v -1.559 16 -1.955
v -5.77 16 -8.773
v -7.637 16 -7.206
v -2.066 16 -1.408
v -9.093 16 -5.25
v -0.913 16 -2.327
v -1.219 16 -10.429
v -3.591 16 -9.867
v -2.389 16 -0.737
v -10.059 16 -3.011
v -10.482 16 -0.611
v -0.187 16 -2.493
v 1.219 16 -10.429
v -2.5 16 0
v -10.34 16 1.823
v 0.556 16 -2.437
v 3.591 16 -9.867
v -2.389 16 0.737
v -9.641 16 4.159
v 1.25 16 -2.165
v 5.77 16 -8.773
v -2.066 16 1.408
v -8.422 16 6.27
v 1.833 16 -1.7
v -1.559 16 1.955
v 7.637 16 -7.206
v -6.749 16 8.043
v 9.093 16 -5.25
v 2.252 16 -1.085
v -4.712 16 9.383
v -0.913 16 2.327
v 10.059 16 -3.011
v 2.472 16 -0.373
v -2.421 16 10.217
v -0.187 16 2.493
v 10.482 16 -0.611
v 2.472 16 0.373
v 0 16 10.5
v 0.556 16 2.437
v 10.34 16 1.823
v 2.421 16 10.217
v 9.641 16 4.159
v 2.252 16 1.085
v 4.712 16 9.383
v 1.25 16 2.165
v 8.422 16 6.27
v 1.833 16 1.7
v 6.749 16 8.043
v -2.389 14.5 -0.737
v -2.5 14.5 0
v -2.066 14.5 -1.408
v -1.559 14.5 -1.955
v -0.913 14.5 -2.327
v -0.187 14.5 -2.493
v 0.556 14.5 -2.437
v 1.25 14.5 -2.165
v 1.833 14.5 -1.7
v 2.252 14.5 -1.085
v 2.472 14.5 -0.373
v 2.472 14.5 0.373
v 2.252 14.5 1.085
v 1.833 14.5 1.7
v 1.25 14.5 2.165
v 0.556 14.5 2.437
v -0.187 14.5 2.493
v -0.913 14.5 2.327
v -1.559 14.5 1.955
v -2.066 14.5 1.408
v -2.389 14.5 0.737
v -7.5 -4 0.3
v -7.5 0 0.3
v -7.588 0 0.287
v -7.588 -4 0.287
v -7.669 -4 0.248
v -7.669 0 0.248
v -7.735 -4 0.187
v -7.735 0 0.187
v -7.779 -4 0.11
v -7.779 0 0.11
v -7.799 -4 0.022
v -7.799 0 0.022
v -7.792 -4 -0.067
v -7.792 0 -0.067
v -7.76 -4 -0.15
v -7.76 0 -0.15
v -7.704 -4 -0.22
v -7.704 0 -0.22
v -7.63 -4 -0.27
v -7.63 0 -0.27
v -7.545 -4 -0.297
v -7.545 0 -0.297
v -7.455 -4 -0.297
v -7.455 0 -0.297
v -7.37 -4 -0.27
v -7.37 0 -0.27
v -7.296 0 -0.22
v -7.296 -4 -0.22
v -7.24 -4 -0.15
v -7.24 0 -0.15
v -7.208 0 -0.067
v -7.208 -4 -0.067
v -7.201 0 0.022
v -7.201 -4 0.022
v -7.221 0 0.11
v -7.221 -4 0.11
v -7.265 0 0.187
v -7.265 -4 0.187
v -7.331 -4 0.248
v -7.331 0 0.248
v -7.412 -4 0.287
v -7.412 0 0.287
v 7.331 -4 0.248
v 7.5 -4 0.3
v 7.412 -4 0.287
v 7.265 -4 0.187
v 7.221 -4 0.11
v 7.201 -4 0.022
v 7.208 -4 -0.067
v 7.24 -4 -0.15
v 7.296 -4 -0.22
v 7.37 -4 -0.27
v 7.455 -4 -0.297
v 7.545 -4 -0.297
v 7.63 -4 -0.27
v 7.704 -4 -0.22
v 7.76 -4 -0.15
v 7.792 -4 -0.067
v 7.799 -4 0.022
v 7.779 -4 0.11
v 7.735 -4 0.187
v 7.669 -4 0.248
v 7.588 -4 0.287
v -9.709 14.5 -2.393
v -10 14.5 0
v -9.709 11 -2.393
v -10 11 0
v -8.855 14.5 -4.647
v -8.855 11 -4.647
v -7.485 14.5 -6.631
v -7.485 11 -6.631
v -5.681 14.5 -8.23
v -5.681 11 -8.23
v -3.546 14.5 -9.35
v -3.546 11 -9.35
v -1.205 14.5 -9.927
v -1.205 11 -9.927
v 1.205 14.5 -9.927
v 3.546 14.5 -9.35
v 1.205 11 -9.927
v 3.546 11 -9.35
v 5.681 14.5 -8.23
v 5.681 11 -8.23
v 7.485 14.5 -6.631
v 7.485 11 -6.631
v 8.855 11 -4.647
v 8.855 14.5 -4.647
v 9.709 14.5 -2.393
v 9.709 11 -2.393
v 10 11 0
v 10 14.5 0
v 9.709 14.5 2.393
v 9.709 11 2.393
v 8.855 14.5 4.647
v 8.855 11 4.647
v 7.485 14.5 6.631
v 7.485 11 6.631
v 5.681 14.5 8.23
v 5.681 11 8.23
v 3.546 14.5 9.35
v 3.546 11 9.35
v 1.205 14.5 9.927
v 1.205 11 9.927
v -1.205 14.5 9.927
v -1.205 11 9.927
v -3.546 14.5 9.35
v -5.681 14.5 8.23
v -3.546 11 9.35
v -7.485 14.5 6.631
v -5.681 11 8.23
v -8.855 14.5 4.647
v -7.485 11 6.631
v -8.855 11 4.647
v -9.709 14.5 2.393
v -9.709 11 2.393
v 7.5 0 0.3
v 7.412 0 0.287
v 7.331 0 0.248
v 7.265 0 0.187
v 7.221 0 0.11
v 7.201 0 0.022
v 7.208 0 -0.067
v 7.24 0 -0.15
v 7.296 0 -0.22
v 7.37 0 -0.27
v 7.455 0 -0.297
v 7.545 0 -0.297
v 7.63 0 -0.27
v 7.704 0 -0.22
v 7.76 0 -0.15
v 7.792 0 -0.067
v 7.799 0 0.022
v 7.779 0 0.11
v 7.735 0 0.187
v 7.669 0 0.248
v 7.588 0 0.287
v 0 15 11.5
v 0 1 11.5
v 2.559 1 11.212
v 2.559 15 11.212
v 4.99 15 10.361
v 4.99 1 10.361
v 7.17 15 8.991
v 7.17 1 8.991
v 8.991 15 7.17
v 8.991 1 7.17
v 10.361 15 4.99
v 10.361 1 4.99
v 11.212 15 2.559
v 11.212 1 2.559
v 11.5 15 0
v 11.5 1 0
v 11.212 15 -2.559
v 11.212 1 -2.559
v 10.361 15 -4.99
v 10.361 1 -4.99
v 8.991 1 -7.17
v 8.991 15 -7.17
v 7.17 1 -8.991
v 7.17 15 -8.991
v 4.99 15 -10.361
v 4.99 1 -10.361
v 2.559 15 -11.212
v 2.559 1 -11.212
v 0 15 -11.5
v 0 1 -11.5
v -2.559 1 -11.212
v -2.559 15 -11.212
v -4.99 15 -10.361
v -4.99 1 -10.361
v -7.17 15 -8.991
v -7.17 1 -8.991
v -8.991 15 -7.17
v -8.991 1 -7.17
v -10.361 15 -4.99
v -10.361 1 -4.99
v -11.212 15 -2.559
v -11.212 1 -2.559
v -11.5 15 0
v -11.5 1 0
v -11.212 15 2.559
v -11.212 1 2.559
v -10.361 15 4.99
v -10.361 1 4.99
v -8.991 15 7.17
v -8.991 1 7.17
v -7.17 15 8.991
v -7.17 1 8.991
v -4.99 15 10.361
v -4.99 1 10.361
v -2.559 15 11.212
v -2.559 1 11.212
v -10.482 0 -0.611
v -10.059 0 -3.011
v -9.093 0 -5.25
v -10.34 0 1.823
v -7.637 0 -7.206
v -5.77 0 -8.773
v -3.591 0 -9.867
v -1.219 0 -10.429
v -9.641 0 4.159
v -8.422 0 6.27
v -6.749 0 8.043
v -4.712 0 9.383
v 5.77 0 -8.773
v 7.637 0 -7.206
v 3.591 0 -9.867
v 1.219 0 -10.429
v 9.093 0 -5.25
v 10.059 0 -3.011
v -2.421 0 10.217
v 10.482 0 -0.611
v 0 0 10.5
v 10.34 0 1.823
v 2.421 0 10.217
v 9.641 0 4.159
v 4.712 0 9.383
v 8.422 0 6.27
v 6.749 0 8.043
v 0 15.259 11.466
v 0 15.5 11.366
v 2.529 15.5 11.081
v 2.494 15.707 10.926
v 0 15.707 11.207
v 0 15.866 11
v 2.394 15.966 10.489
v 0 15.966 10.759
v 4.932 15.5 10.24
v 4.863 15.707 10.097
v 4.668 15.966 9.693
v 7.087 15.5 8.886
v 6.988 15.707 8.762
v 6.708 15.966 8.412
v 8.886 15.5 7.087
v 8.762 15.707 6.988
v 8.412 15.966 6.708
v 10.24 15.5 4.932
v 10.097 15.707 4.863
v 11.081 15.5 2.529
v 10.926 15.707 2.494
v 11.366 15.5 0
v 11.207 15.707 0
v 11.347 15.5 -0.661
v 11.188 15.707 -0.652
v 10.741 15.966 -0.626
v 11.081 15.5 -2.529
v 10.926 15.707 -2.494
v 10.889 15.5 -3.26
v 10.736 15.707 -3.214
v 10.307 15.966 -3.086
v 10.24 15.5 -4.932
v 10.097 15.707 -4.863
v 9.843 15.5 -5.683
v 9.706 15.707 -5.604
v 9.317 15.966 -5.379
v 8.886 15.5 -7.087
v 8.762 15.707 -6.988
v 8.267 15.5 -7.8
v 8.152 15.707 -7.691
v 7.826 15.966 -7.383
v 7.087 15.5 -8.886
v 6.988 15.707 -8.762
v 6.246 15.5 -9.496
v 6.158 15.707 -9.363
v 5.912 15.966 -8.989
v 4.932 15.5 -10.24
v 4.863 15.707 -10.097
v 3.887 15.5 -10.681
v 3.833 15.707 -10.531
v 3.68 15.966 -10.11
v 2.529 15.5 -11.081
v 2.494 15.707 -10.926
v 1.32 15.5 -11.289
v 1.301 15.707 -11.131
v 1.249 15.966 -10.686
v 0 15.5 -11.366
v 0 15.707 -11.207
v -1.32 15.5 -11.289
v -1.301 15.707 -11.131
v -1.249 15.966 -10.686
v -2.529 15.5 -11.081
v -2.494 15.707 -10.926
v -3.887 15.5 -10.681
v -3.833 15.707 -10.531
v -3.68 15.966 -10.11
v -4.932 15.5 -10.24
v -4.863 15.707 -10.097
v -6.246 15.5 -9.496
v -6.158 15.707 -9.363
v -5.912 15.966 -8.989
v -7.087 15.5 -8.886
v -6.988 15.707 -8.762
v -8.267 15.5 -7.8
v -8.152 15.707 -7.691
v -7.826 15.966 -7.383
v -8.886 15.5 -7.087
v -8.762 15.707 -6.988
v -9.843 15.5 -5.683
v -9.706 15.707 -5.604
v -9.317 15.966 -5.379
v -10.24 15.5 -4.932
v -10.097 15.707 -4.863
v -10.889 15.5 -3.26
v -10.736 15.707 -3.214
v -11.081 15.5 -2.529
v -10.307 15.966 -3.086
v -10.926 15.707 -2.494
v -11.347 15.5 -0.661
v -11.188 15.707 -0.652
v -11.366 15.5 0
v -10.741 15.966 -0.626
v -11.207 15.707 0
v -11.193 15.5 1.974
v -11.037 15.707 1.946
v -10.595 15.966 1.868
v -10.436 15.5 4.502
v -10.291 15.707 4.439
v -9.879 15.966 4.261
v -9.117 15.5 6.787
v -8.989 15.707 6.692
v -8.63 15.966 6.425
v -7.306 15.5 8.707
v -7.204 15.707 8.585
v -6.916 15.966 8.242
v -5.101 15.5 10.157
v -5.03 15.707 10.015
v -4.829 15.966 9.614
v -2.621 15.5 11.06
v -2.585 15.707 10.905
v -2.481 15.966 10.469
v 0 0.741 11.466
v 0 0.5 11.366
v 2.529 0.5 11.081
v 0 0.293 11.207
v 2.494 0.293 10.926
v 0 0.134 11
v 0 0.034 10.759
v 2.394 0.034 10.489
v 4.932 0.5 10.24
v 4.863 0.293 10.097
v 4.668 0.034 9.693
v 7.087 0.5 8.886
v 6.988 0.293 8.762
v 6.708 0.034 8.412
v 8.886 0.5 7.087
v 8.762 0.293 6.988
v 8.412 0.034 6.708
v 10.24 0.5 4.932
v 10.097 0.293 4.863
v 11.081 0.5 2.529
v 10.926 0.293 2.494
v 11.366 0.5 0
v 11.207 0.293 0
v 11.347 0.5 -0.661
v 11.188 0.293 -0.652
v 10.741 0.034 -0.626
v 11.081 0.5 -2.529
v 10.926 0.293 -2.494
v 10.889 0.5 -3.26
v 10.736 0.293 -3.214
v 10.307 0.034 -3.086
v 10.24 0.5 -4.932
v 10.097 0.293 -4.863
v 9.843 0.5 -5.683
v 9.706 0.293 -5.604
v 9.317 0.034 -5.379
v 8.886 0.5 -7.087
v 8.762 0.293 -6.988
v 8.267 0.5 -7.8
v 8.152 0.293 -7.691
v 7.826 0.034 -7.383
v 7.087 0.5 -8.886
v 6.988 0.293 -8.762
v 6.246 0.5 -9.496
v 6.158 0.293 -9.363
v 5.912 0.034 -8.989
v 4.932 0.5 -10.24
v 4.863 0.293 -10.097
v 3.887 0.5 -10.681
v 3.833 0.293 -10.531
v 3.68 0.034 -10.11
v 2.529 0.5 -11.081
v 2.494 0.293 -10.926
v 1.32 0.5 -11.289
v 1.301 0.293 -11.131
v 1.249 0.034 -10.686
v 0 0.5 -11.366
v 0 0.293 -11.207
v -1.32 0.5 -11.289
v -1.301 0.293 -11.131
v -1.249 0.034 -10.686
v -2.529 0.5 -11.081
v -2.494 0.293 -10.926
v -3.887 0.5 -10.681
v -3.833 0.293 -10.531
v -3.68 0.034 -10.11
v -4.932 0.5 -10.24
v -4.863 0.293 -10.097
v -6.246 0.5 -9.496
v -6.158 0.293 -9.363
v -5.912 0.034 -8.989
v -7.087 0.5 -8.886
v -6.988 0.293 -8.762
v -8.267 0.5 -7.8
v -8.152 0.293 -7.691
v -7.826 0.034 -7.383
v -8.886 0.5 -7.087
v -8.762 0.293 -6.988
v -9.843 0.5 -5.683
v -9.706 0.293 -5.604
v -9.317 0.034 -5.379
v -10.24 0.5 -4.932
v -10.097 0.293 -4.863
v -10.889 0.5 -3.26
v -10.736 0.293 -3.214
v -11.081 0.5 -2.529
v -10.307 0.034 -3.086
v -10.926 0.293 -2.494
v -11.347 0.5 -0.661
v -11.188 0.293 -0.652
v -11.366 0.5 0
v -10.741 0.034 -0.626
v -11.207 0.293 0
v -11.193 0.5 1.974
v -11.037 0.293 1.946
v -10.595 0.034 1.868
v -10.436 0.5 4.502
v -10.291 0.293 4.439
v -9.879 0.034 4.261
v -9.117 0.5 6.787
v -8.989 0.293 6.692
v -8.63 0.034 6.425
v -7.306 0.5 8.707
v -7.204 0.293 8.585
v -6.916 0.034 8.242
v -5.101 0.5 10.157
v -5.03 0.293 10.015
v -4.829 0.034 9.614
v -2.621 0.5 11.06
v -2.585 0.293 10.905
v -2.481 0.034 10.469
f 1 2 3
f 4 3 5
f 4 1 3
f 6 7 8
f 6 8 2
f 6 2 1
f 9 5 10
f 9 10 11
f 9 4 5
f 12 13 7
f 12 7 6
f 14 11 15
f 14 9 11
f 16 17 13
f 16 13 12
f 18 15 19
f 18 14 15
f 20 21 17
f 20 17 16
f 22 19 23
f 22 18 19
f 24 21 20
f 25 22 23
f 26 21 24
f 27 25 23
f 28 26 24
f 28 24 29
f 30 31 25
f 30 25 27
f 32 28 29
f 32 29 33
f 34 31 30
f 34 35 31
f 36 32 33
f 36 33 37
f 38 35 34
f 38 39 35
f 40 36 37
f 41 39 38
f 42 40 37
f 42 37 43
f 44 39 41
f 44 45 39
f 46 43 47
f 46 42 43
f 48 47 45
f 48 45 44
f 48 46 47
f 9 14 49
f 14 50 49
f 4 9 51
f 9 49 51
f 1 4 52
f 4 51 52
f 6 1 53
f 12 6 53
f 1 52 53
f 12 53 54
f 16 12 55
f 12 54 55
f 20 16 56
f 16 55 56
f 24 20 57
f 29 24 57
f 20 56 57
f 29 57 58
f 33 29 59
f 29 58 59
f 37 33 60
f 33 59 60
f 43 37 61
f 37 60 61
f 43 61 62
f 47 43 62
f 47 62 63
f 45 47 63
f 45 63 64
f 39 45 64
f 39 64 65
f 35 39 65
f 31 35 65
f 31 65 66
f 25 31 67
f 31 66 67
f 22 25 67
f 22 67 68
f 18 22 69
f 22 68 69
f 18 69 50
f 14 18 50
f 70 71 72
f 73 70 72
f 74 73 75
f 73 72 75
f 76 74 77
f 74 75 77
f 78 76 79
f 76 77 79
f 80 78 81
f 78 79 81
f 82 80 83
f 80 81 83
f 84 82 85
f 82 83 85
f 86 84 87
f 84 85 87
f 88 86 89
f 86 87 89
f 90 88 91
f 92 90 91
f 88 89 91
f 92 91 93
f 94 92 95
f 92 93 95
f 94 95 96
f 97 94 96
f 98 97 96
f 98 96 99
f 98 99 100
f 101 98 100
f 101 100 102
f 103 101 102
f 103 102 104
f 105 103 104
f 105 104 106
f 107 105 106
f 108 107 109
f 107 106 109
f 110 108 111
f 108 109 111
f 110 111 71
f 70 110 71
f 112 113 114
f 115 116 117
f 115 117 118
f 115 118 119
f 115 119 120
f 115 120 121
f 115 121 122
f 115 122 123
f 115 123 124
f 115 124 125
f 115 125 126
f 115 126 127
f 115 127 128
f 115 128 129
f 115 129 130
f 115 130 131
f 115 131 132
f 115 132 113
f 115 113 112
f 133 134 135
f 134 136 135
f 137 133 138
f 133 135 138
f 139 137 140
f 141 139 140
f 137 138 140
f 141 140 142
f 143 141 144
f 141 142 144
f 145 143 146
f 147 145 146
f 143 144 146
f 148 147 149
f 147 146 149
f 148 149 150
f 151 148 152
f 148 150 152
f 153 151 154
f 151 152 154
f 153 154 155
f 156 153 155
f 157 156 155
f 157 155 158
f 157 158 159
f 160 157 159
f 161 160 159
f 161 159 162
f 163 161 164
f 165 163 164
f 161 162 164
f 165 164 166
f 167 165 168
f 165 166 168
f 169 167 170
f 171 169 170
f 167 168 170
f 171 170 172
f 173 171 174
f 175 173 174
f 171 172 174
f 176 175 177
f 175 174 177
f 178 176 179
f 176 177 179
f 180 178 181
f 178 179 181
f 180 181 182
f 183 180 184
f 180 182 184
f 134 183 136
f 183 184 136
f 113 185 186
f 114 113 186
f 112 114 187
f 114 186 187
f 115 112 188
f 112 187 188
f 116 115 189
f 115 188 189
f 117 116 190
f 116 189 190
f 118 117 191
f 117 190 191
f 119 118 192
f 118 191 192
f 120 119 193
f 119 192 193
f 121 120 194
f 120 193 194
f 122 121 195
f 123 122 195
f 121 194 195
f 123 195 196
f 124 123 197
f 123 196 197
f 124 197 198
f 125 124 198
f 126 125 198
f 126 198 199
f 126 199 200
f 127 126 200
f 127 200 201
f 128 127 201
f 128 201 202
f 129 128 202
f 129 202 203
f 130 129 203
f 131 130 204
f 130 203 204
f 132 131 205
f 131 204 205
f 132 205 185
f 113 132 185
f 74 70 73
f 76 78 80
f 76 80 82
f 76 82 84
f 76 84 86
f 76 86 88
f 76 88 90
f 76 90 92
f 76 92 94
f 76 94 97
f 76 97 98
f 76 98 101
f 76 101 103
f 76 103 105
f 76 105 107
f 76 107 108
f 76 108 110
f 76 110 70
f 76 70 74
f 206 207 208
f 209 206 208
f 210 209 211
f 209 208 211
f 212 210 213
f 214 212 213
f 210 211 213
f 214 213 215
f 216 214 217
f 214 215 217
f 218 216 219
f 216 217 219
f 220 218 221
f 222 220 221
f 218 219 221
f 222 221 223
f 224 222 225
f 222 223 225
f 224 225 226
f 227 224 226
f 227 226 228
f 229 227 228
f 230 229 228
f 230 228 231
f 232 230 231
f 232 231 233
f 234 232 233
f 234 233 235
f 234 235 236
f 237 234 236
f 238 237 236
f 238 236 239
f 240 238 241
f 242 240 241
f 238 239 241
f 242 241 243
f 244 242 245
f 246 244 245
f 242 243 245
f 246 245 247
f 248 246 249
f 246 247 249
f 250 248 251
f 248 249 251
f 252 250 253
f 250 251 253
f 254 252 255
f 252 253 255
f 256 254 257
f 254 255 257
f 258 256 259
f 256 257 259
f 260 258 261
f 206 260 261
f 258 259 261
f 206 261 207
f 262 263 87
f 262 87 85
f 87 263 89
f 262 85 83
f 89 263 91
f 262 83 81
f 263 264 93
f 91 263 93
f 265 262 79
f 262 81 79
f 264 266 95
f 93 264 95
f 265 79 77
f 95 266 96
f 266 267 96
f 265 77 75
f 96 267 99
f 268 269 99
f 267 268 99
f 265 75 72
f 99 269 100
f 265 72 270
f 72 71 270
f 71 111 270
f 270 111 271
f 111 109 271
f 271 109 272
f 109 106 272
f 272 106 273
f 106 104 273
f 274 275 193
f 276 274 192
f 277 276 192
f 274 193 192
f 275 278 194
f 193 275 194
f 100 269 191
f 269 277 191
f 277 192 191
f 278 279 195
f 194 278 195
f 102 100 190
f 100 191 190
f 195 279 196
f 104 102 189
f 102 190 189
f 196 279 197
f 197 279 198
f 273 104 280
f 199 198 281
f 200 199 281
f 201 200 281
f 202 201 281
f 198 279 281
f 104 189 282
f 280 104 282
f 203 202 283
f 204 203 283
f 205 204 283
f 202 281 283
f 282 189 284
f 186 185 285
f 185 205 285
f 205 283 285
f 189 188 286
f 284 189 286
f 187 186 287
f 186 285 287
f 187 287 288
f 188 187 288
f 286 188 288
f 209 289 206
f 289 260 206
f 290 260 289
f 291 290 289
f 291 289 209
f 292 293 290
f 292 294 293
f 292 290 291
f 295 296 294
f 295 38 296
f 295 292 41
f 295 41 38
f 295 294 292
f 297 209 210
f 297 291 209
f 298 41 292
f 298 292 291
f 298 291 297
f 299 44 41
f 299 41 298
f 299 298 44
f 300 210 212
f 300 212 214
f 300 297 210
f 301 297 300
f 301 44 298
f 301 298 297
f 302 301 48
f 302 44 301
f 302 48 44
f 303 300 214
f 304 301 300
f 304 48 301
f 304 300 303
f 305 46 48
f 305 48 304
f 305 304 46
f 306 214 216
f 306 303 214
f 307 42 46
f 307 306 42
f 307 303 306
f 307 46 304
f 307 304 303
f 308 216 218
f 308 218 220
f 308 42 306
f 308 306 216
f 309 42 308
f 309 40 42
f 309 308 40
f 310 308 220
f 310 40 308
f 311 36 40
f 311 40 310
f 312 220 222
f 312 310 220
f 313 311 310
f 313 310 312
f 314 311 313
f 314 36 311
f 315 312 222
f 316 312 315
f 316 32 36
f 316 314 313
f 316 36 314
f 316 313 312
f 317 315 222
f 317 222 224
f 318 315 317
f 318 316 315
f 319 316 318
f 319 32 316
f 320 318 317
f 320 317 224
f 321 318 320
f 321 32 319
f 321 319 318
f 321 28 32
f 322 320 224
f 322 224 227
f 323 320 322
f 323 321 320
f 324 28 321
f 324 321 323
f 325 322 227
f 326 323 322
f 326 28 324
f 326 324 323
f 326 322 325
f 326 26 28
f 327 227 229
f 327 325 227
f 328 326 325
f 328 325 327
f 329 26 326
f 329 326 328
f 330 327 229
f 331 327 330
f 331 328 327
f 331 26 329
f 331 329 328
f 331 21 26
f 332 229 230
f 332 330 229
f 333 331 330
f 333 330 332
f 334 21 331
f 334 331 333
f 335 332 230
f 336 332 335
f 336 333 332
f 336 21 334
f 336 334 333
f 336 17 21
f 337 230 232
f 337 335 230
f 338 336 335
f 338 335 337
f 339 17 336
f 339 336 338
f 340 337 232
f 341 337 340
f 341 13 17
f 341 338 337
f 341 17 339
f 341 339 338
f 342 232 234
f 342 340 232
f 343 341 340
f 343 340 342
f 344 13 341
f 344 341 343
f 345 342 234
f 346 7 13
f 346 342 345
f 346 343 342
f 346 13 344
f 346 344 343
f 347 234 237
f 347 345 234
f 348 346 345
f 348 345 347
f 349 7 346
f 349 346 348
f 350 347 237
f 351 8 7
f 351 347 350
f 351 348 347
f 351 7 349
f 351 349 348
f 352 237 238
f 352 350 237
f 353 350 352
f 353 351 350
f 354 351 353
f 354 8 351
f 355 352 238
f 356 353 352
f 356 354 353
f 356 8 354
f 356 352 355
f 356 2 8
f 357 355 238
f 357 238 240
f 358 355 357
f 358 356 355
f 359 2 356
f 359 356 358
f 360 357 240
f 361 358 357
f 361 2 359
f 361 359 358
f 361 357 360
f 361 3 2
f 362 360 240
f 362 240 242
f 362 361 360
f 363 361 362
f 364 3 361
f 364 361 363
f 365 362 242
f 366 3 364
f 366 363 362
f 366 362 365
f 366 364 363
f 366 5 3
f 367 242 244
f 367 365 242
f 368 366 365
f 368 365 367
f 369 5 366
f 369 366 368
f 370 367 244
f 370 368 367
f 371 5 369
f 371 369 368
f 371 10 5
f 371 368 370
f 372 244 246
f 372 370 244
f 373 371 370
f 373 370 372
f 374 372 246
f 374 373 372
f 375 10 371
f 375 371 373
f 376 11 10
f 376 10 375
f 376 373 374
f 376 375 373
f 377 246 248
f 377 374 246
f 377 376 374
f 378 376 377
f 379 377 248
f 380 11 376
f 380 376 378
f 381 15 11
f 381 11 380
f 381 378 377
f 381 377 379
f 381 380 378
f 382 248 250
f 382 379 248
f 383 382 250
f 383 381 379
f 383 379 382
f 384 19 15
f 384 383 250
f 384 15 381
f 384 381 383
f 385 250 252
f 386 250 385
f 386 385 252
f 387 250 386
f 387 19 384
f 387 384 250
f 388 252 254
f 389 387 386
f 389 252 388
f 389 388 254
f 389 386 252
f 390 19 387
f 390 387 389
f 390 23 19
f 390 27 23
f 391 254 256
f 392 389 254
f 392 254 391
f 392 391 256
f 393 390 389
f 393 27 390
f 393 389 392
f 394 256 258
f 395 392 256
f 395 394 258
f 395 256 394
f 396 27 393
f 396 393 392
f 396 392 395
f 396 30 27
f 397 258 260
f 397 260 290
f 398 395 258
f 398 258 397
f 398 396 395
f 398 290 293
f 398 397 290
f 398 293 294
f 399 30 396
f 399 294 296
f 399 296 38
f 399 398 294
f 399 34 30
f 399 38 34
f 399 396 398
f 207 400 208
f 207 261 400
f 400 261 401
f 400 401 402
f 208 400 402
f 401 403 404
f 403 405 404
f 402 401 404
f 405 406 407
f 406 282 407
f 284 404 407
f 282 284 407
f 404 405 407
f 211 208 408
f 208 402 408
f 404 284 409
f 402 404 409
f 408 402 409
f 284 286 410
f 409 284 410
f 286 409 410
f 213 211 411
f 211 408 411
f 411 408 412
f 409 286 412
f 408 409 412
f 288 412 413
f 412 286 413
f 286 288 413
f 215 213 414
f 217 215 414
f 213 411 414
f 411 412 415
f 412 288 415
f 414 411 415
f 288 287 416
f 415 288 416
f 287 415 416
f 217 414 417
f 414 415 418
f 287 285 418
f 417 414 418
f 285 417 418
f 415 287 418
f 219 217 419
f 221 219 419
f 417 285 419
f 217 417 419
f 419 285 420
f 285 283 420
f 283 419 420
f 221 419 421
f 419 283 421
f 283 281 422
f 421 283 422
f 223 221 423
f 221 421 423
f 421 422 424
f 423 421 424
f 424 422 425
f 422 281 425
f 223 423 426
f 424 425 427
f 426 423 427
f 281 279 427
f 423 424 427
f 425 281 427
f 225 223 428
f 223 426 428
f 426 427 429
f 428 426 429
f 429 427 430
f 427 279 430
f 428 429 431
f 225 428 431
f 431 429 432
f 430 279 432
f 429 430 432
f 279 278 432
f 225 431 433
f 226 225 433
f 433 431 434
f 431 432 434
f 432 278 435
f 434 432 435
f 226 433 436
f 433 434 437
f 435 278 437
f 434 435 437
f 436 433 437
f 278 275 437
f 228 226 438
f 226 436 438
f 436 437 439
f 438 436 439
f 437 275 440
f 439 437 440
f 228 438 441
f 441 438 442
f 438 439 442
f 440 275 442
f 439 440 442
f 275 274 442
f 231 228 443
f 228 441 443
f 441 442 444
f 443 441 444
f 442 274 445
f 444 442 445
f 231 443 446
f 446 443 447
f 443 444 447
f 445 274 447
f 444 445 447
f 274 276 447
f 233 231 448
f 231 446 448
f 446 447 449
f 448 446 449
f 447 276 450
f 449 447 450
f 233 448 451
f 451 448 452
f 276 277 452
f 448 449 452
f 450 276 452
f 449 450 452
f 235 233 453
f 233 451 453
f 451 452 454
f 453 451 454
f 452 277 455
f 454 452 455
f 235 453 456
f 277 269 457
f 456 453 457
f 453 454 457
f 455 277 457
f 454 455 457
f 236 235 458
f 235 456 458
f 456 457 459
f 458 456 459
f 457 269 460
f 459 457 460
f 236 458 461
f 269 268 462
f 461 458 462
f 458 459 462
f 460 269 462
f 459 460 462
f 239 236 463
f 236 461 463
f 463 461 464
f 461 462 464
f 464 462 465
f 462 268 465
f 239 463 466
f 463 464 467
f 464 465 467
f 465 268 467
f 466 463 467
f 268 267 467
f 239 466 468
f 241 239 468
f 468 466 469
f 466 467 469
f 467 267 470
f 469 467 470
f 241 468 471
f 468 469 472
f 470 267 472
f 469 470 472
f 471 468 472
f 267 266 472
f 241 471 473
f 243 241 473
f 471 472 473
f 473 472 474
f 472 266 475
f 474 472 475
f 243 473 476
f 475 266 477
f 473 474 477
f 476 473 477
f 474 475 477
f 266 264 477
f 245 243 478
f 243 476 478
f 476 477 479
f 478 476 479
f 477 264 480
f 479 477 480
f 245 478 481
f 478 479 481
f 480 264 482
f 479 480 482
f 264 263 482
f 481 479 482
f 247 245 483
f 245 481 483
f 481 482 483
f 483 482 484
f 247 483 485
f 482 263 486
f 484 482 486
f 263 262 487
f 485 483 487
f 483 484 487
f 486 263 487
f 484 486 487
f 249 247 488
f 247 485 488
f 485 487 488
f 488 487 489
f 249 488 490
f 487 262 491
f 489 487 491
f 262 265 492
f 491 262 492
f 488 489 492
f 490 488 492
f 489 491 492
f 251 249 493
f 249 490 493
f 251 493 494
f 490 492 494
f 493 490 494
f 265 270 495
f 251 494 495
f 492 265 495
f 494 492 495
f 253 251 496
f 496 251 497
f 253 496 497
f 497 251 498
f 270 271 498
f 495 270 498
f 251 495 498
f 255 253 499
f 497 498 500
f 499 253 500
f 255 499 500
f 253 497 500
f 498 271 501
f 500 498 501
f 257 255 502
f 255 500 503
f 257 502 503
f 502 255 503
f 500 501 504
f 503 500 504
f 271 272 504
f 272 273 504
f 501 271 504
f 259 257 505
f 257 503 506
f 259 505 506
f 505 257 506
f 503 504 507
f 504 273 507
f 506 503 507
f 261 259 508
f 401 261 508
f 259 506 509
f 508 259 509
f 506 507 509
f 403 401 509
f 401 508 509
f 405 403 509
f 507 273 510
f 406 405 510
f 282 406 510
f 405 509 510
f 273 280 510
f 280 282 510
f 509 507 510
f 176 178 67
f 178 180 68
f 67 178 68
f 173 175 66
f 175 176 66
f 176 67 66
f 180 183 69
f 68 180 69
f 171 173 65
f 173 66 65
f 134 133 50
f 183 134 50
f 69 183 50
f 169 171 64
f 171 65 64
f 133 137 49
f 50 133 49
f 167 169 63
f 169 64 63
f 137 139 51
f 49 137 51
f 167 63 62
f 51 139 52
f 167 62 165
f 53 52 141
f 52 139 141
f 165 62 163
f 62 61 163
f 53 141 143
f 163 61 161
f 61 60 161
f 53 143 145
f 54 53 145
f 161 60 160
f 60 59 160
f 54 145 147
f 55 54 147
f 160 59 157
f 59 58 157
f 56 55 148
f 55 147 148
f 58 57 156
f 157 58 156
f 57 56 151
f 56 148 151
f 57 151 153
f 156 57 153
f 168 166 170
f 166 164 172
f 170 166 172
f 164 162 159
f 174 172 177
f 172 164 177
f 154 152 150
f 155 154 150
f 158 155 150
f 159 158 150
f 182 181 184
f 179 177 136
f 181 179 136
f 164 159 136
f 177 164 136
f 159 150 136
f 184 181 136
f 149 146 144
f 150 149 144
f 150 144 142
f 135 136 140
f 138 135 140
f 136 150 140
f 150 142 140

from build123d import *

# Parameters (mm, degrees)
SKETCH_1_R      = 11.5
EXTRUDE_1_DEPTH = 16
SKETCH_2_R      = 0.3
EXTRUDE_2_DEPTH = 4
FILLET_1_R      = 1


with BuildPart() as part:
    # 草图1 → 凸台-拉伸1 (new body)
    with BuildSketch(Plane(origin=(0, 0, 0), x_dir=(1, 0, 0), z_dir=(0, 1, 0))):
        with Locations(Location((0, 0, 0), (0, 0, 270))):
            Circle(SKETCH_1_R)
    extrude(amount=EXTRUDE_1_DEPTH)

    # 草图2 → 凸台-拉伸2 (add)
    with BuildSketch(Plane.XZ):
        with Locations(Location((-7.5, 0, 0), (0, 0, 90))):
            Circle(SKETCH_2_R)
        with Locations(Location((7.5, 0, 0), (0, 0, 90))):
            Circle(SKETCH_2_R)
    extrude(amount=EXTRUDE_2_DEPTH)

    # 草图3 → 切除-旋转1 (revolve, cut)
    with BuildSketch(Plane(origin=(0, 19, 0), x_dir=(1, 0, 0), z_dir=(0, 0, -1))):
        Polygon((0, 3), (-2.5, 3), (-2.5, 4.5), (-10, 4.5), (-10, 8), (0, 8), align=None)
    revolve(axis=Axis((0, 34.240243578, 0), (0, -1, 0)), mode=Mode.SUBTRACT)

    # 圆角1
    fillet_1_edges = [part.edges().sort_by_distance(p)[0] for p in [
        (0, 0, -11.5),
        (0, 16, -11.5),
    ]]
    fillet(fillet_1_edges, radius=FILLET_1_R)


solid = part.part
